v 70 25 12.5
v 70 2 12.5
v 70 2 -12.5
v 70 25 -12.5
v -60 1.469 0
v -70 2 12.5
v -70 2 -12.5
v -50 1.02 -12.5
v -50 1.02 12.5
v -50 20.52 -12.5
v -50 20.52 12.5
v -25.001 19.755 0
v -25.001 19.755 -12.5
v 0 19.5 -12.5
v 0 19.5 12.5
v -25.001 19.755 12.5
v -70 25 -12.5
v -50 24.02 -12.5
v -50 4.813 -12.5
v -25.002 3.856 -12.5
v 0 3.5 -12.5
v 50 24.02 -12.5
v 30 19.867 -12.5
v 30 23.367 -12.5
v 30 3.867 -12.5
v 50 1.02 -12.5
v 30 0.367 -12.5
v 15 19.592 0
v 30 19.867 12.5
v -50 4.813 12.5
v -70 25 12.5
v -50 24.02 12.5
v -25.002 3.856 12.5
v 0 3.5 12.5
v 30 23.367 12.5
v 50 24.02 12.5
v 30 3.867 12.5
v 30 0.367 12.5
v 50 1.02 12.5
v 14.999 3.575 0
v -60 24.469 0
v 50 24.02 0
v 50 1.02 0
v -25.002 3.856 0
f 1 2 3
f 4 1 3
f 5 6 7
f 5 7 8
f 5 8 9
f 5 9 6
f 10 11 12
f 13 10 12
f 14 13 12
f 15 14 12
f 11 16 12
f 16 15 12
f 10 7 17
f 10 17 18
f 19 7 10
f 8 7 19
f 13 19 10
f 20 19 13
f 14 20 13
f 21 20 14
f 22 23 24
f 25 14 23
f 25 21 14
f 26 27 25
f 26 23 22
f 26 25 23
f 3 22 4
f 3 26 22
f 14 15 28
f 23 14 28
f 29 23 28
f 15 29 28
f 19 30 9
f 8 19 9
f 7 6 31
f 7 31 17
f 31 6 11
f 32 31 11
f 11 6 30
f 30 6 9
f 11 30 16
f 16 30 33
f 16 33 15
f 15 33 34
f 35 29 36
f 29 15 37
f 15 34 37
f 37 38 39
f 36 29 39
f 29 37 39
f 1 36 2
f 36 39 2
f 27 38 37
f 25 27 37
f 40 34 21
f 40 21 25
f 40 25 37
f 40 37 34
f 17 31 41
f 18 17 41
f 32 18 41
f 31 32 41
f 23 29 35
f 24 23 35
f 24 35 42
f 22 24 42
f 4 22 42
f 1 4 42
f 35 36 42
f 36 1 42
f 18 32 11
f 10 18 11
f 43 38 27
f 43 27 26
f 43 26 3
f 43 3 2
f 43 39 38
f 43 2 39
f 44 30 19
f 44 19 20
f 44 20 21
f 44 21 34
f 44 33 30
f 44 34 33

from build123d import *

# Parameters (mm, degrees)
SKETCH1_W           = 140
SKETCH1_H           = 25
BOSS_EXTRUDE1_DEPTH = 25
CUT_EXTRUDE1_DEPTH  = 25


with BuildPart() as part:
    # Sketch1 → Boss-Extrude1 (new body)
    with BuildSketch(Plane(origin=(0, 0, 0), x_dir=(1, 0, 0), z_dir=(0, 1, 0))):
        Rectangle(SKETCH1_W, SKETCH1_H)
    extrude(amount=BOSS_EXTRUDE1_DEPTH)

    # Sketch5 → Cut-Extrude1 (cut)
    with BuildSketch(Plane.XY.offset(12.5)):
        with BuildLine():
            add(Edge.make_bspline(
                [(0, 23), (15, 23), (30, 23.367346939)],
                knots=[0.5, 0.5, 0.5, 0.714285714, 0.714285714, 0.714285714], degree=2))
            add(Edge.make_bspline(
                [(30, 23.367346939), (50, 23.857142857), (70, 25)],
                knots=[0.714285714, 0.714285714, 0.714285714, 1, 1, 1], degree=2))
            Line((70, 25), (30, 25))
            Line((30, 25), (0, 25))
            Line((0, 25), (0, 23))
        make_face()
        with BuildLine():
            add(Edge.make_bspline(
                [(-50, 24.020408163), (-25, 23), (0, 23)],
                knots=[0.142857143, 0.142857143, 0.142857143, 0.5, 0.5, 0.5], degree=2))
            Line((0, 23), (0, 25))
            Line((0, 25), (-50, 25))
            Line((-50, 25), (-70, 25))
            add(Edge.make_bspline(
                [(-70, 25), (-60, 24.428571429), (-50, 24.020408163)],
                knots=[0, 0, 0, 0.142857143, 0.142857143, 0.142857143], degree=2))
        make_face()
        with BuildLine():
            Line((30, 19.867346939), (30, 23.367346939))
            add(Edge.make_bspline(
                [(0, 23), (15, 23), (30, 23.367346939)],
                knots=[0.5, 0.5, 0.5, 0.714285714, 0.714285714, 0.714285714], degree=2))
            Line((0, 23), (0, 19.5))
            add(Edge.make_bspline(
                [(0, 19.5), (14.999250637, 19.500030588), (30, 19.867346939)],
                knots=[0.625031228, 0.625031228, 0.625031228, 1, 1, 1], degree=2))
        make_face()
        with BuildLine():
            Line((0, 19.5), (0, 23))
            add(Edge.make_bspline(
                [(-50, 24.020408163), (-25, 23), (0, 23)],
                knots=[0.142857143, 0.142857143, 0.142857143, 0.5, 0.5, 0.5], degree=2))
            Line((-50, 24.020408163), (-50, 21.5))
            Line((-50, 21.5), (-50, 20.520408163))
            add(Edge.make_bspline(
                [(-50, 20.520408163), (-25.002082119, 19.499949013), (0, 19.5)],
                knots=[0, 0, 0, 0.625031228, 0.625031228, 0.625031228], degree=2))
        make_face()
        with BuildLine():
            Line((0, 0), (0, 3.5))
            add(Edge.make_bspline(
                [(-50, 4.813033374), (-25.004215516, 3.554754755), (0, 3.5)],
                knots=[0, 0, 0, 0.625063216, 0.625063216, 0.625063216], degree=2))
            Line((-50, 4.813033374), (-50, 1.020408163))
            add(Edge.make_bspline(
                [(-50, 1.020408163), (-25, 0), (0, 0)],
                knots=[0.142857143, 0.142857143, 0.142857143, 0.5, 0.5, 0.5], degree=2))
        make_face()
        with BuildLine():
            Line((30, 0.367346939), (30, 3.867346939))
            add(Edge.make_bspline(
                [(0, 3.5), (14.998483233, 3.467156007), (30, 3.867346939)],
                knots=[0.625063216, 0.625063216, 0.625063216, 1, 1, 1], degree=2))
            Line((0, 3.5), (0, 0))
            add(Edge.make_bspline(
                [(0, 0), (15, 0), (30, 0.367346939)],
                knots=[0.5, 0.5, 0.5, 0.714285714, 0.714285714, 0.714285714], degree=2))
        make_face()
        with BuildLine():
            Line((70, 0), (70, 2))
            add(Edge.make_bspline(
                [(30, 0.367346939), (50, 0.857142857), (70, 2)],
                knots=[0.714285714, 0.714285714, 0.714285714, 1, 1, 1], degree=2))
            add(Edge.make_bspline(
                [(0, 0), (15, 0), (30, 0.367346939)],
                knots=[0.5, 0.5, 0.5, 0.714285714, 0.714285714, 0.714285714], degree=2))
            Line((0, 0), (70, 0))
        make_face()
        with BuildLine():
            Line((-70, 0), (0, 0))
            add(Edge.make_bspline(
                [(-50, 1.020408163), (-25, 0), (0, 0)],
                knots=[0.142857143, 0.142857143, 0.142857143, 0.5, 0.5, 0.5], degree=2))
            add(Edge.make_bspline(
                [(-70, 2), (-60, 1.428571429), (-50, 1.020408163)],
                knots=[0, 0, 0, 0.142857143, 0.142857143, 0.142857143], degree=2))
            Line((-70, 2), (-70, 0))
        make_face()
    extrude(amount=-CUT_EXTRUDE1_DEPTH, mode=Mode.SUBTRACT)


solid = part.part
